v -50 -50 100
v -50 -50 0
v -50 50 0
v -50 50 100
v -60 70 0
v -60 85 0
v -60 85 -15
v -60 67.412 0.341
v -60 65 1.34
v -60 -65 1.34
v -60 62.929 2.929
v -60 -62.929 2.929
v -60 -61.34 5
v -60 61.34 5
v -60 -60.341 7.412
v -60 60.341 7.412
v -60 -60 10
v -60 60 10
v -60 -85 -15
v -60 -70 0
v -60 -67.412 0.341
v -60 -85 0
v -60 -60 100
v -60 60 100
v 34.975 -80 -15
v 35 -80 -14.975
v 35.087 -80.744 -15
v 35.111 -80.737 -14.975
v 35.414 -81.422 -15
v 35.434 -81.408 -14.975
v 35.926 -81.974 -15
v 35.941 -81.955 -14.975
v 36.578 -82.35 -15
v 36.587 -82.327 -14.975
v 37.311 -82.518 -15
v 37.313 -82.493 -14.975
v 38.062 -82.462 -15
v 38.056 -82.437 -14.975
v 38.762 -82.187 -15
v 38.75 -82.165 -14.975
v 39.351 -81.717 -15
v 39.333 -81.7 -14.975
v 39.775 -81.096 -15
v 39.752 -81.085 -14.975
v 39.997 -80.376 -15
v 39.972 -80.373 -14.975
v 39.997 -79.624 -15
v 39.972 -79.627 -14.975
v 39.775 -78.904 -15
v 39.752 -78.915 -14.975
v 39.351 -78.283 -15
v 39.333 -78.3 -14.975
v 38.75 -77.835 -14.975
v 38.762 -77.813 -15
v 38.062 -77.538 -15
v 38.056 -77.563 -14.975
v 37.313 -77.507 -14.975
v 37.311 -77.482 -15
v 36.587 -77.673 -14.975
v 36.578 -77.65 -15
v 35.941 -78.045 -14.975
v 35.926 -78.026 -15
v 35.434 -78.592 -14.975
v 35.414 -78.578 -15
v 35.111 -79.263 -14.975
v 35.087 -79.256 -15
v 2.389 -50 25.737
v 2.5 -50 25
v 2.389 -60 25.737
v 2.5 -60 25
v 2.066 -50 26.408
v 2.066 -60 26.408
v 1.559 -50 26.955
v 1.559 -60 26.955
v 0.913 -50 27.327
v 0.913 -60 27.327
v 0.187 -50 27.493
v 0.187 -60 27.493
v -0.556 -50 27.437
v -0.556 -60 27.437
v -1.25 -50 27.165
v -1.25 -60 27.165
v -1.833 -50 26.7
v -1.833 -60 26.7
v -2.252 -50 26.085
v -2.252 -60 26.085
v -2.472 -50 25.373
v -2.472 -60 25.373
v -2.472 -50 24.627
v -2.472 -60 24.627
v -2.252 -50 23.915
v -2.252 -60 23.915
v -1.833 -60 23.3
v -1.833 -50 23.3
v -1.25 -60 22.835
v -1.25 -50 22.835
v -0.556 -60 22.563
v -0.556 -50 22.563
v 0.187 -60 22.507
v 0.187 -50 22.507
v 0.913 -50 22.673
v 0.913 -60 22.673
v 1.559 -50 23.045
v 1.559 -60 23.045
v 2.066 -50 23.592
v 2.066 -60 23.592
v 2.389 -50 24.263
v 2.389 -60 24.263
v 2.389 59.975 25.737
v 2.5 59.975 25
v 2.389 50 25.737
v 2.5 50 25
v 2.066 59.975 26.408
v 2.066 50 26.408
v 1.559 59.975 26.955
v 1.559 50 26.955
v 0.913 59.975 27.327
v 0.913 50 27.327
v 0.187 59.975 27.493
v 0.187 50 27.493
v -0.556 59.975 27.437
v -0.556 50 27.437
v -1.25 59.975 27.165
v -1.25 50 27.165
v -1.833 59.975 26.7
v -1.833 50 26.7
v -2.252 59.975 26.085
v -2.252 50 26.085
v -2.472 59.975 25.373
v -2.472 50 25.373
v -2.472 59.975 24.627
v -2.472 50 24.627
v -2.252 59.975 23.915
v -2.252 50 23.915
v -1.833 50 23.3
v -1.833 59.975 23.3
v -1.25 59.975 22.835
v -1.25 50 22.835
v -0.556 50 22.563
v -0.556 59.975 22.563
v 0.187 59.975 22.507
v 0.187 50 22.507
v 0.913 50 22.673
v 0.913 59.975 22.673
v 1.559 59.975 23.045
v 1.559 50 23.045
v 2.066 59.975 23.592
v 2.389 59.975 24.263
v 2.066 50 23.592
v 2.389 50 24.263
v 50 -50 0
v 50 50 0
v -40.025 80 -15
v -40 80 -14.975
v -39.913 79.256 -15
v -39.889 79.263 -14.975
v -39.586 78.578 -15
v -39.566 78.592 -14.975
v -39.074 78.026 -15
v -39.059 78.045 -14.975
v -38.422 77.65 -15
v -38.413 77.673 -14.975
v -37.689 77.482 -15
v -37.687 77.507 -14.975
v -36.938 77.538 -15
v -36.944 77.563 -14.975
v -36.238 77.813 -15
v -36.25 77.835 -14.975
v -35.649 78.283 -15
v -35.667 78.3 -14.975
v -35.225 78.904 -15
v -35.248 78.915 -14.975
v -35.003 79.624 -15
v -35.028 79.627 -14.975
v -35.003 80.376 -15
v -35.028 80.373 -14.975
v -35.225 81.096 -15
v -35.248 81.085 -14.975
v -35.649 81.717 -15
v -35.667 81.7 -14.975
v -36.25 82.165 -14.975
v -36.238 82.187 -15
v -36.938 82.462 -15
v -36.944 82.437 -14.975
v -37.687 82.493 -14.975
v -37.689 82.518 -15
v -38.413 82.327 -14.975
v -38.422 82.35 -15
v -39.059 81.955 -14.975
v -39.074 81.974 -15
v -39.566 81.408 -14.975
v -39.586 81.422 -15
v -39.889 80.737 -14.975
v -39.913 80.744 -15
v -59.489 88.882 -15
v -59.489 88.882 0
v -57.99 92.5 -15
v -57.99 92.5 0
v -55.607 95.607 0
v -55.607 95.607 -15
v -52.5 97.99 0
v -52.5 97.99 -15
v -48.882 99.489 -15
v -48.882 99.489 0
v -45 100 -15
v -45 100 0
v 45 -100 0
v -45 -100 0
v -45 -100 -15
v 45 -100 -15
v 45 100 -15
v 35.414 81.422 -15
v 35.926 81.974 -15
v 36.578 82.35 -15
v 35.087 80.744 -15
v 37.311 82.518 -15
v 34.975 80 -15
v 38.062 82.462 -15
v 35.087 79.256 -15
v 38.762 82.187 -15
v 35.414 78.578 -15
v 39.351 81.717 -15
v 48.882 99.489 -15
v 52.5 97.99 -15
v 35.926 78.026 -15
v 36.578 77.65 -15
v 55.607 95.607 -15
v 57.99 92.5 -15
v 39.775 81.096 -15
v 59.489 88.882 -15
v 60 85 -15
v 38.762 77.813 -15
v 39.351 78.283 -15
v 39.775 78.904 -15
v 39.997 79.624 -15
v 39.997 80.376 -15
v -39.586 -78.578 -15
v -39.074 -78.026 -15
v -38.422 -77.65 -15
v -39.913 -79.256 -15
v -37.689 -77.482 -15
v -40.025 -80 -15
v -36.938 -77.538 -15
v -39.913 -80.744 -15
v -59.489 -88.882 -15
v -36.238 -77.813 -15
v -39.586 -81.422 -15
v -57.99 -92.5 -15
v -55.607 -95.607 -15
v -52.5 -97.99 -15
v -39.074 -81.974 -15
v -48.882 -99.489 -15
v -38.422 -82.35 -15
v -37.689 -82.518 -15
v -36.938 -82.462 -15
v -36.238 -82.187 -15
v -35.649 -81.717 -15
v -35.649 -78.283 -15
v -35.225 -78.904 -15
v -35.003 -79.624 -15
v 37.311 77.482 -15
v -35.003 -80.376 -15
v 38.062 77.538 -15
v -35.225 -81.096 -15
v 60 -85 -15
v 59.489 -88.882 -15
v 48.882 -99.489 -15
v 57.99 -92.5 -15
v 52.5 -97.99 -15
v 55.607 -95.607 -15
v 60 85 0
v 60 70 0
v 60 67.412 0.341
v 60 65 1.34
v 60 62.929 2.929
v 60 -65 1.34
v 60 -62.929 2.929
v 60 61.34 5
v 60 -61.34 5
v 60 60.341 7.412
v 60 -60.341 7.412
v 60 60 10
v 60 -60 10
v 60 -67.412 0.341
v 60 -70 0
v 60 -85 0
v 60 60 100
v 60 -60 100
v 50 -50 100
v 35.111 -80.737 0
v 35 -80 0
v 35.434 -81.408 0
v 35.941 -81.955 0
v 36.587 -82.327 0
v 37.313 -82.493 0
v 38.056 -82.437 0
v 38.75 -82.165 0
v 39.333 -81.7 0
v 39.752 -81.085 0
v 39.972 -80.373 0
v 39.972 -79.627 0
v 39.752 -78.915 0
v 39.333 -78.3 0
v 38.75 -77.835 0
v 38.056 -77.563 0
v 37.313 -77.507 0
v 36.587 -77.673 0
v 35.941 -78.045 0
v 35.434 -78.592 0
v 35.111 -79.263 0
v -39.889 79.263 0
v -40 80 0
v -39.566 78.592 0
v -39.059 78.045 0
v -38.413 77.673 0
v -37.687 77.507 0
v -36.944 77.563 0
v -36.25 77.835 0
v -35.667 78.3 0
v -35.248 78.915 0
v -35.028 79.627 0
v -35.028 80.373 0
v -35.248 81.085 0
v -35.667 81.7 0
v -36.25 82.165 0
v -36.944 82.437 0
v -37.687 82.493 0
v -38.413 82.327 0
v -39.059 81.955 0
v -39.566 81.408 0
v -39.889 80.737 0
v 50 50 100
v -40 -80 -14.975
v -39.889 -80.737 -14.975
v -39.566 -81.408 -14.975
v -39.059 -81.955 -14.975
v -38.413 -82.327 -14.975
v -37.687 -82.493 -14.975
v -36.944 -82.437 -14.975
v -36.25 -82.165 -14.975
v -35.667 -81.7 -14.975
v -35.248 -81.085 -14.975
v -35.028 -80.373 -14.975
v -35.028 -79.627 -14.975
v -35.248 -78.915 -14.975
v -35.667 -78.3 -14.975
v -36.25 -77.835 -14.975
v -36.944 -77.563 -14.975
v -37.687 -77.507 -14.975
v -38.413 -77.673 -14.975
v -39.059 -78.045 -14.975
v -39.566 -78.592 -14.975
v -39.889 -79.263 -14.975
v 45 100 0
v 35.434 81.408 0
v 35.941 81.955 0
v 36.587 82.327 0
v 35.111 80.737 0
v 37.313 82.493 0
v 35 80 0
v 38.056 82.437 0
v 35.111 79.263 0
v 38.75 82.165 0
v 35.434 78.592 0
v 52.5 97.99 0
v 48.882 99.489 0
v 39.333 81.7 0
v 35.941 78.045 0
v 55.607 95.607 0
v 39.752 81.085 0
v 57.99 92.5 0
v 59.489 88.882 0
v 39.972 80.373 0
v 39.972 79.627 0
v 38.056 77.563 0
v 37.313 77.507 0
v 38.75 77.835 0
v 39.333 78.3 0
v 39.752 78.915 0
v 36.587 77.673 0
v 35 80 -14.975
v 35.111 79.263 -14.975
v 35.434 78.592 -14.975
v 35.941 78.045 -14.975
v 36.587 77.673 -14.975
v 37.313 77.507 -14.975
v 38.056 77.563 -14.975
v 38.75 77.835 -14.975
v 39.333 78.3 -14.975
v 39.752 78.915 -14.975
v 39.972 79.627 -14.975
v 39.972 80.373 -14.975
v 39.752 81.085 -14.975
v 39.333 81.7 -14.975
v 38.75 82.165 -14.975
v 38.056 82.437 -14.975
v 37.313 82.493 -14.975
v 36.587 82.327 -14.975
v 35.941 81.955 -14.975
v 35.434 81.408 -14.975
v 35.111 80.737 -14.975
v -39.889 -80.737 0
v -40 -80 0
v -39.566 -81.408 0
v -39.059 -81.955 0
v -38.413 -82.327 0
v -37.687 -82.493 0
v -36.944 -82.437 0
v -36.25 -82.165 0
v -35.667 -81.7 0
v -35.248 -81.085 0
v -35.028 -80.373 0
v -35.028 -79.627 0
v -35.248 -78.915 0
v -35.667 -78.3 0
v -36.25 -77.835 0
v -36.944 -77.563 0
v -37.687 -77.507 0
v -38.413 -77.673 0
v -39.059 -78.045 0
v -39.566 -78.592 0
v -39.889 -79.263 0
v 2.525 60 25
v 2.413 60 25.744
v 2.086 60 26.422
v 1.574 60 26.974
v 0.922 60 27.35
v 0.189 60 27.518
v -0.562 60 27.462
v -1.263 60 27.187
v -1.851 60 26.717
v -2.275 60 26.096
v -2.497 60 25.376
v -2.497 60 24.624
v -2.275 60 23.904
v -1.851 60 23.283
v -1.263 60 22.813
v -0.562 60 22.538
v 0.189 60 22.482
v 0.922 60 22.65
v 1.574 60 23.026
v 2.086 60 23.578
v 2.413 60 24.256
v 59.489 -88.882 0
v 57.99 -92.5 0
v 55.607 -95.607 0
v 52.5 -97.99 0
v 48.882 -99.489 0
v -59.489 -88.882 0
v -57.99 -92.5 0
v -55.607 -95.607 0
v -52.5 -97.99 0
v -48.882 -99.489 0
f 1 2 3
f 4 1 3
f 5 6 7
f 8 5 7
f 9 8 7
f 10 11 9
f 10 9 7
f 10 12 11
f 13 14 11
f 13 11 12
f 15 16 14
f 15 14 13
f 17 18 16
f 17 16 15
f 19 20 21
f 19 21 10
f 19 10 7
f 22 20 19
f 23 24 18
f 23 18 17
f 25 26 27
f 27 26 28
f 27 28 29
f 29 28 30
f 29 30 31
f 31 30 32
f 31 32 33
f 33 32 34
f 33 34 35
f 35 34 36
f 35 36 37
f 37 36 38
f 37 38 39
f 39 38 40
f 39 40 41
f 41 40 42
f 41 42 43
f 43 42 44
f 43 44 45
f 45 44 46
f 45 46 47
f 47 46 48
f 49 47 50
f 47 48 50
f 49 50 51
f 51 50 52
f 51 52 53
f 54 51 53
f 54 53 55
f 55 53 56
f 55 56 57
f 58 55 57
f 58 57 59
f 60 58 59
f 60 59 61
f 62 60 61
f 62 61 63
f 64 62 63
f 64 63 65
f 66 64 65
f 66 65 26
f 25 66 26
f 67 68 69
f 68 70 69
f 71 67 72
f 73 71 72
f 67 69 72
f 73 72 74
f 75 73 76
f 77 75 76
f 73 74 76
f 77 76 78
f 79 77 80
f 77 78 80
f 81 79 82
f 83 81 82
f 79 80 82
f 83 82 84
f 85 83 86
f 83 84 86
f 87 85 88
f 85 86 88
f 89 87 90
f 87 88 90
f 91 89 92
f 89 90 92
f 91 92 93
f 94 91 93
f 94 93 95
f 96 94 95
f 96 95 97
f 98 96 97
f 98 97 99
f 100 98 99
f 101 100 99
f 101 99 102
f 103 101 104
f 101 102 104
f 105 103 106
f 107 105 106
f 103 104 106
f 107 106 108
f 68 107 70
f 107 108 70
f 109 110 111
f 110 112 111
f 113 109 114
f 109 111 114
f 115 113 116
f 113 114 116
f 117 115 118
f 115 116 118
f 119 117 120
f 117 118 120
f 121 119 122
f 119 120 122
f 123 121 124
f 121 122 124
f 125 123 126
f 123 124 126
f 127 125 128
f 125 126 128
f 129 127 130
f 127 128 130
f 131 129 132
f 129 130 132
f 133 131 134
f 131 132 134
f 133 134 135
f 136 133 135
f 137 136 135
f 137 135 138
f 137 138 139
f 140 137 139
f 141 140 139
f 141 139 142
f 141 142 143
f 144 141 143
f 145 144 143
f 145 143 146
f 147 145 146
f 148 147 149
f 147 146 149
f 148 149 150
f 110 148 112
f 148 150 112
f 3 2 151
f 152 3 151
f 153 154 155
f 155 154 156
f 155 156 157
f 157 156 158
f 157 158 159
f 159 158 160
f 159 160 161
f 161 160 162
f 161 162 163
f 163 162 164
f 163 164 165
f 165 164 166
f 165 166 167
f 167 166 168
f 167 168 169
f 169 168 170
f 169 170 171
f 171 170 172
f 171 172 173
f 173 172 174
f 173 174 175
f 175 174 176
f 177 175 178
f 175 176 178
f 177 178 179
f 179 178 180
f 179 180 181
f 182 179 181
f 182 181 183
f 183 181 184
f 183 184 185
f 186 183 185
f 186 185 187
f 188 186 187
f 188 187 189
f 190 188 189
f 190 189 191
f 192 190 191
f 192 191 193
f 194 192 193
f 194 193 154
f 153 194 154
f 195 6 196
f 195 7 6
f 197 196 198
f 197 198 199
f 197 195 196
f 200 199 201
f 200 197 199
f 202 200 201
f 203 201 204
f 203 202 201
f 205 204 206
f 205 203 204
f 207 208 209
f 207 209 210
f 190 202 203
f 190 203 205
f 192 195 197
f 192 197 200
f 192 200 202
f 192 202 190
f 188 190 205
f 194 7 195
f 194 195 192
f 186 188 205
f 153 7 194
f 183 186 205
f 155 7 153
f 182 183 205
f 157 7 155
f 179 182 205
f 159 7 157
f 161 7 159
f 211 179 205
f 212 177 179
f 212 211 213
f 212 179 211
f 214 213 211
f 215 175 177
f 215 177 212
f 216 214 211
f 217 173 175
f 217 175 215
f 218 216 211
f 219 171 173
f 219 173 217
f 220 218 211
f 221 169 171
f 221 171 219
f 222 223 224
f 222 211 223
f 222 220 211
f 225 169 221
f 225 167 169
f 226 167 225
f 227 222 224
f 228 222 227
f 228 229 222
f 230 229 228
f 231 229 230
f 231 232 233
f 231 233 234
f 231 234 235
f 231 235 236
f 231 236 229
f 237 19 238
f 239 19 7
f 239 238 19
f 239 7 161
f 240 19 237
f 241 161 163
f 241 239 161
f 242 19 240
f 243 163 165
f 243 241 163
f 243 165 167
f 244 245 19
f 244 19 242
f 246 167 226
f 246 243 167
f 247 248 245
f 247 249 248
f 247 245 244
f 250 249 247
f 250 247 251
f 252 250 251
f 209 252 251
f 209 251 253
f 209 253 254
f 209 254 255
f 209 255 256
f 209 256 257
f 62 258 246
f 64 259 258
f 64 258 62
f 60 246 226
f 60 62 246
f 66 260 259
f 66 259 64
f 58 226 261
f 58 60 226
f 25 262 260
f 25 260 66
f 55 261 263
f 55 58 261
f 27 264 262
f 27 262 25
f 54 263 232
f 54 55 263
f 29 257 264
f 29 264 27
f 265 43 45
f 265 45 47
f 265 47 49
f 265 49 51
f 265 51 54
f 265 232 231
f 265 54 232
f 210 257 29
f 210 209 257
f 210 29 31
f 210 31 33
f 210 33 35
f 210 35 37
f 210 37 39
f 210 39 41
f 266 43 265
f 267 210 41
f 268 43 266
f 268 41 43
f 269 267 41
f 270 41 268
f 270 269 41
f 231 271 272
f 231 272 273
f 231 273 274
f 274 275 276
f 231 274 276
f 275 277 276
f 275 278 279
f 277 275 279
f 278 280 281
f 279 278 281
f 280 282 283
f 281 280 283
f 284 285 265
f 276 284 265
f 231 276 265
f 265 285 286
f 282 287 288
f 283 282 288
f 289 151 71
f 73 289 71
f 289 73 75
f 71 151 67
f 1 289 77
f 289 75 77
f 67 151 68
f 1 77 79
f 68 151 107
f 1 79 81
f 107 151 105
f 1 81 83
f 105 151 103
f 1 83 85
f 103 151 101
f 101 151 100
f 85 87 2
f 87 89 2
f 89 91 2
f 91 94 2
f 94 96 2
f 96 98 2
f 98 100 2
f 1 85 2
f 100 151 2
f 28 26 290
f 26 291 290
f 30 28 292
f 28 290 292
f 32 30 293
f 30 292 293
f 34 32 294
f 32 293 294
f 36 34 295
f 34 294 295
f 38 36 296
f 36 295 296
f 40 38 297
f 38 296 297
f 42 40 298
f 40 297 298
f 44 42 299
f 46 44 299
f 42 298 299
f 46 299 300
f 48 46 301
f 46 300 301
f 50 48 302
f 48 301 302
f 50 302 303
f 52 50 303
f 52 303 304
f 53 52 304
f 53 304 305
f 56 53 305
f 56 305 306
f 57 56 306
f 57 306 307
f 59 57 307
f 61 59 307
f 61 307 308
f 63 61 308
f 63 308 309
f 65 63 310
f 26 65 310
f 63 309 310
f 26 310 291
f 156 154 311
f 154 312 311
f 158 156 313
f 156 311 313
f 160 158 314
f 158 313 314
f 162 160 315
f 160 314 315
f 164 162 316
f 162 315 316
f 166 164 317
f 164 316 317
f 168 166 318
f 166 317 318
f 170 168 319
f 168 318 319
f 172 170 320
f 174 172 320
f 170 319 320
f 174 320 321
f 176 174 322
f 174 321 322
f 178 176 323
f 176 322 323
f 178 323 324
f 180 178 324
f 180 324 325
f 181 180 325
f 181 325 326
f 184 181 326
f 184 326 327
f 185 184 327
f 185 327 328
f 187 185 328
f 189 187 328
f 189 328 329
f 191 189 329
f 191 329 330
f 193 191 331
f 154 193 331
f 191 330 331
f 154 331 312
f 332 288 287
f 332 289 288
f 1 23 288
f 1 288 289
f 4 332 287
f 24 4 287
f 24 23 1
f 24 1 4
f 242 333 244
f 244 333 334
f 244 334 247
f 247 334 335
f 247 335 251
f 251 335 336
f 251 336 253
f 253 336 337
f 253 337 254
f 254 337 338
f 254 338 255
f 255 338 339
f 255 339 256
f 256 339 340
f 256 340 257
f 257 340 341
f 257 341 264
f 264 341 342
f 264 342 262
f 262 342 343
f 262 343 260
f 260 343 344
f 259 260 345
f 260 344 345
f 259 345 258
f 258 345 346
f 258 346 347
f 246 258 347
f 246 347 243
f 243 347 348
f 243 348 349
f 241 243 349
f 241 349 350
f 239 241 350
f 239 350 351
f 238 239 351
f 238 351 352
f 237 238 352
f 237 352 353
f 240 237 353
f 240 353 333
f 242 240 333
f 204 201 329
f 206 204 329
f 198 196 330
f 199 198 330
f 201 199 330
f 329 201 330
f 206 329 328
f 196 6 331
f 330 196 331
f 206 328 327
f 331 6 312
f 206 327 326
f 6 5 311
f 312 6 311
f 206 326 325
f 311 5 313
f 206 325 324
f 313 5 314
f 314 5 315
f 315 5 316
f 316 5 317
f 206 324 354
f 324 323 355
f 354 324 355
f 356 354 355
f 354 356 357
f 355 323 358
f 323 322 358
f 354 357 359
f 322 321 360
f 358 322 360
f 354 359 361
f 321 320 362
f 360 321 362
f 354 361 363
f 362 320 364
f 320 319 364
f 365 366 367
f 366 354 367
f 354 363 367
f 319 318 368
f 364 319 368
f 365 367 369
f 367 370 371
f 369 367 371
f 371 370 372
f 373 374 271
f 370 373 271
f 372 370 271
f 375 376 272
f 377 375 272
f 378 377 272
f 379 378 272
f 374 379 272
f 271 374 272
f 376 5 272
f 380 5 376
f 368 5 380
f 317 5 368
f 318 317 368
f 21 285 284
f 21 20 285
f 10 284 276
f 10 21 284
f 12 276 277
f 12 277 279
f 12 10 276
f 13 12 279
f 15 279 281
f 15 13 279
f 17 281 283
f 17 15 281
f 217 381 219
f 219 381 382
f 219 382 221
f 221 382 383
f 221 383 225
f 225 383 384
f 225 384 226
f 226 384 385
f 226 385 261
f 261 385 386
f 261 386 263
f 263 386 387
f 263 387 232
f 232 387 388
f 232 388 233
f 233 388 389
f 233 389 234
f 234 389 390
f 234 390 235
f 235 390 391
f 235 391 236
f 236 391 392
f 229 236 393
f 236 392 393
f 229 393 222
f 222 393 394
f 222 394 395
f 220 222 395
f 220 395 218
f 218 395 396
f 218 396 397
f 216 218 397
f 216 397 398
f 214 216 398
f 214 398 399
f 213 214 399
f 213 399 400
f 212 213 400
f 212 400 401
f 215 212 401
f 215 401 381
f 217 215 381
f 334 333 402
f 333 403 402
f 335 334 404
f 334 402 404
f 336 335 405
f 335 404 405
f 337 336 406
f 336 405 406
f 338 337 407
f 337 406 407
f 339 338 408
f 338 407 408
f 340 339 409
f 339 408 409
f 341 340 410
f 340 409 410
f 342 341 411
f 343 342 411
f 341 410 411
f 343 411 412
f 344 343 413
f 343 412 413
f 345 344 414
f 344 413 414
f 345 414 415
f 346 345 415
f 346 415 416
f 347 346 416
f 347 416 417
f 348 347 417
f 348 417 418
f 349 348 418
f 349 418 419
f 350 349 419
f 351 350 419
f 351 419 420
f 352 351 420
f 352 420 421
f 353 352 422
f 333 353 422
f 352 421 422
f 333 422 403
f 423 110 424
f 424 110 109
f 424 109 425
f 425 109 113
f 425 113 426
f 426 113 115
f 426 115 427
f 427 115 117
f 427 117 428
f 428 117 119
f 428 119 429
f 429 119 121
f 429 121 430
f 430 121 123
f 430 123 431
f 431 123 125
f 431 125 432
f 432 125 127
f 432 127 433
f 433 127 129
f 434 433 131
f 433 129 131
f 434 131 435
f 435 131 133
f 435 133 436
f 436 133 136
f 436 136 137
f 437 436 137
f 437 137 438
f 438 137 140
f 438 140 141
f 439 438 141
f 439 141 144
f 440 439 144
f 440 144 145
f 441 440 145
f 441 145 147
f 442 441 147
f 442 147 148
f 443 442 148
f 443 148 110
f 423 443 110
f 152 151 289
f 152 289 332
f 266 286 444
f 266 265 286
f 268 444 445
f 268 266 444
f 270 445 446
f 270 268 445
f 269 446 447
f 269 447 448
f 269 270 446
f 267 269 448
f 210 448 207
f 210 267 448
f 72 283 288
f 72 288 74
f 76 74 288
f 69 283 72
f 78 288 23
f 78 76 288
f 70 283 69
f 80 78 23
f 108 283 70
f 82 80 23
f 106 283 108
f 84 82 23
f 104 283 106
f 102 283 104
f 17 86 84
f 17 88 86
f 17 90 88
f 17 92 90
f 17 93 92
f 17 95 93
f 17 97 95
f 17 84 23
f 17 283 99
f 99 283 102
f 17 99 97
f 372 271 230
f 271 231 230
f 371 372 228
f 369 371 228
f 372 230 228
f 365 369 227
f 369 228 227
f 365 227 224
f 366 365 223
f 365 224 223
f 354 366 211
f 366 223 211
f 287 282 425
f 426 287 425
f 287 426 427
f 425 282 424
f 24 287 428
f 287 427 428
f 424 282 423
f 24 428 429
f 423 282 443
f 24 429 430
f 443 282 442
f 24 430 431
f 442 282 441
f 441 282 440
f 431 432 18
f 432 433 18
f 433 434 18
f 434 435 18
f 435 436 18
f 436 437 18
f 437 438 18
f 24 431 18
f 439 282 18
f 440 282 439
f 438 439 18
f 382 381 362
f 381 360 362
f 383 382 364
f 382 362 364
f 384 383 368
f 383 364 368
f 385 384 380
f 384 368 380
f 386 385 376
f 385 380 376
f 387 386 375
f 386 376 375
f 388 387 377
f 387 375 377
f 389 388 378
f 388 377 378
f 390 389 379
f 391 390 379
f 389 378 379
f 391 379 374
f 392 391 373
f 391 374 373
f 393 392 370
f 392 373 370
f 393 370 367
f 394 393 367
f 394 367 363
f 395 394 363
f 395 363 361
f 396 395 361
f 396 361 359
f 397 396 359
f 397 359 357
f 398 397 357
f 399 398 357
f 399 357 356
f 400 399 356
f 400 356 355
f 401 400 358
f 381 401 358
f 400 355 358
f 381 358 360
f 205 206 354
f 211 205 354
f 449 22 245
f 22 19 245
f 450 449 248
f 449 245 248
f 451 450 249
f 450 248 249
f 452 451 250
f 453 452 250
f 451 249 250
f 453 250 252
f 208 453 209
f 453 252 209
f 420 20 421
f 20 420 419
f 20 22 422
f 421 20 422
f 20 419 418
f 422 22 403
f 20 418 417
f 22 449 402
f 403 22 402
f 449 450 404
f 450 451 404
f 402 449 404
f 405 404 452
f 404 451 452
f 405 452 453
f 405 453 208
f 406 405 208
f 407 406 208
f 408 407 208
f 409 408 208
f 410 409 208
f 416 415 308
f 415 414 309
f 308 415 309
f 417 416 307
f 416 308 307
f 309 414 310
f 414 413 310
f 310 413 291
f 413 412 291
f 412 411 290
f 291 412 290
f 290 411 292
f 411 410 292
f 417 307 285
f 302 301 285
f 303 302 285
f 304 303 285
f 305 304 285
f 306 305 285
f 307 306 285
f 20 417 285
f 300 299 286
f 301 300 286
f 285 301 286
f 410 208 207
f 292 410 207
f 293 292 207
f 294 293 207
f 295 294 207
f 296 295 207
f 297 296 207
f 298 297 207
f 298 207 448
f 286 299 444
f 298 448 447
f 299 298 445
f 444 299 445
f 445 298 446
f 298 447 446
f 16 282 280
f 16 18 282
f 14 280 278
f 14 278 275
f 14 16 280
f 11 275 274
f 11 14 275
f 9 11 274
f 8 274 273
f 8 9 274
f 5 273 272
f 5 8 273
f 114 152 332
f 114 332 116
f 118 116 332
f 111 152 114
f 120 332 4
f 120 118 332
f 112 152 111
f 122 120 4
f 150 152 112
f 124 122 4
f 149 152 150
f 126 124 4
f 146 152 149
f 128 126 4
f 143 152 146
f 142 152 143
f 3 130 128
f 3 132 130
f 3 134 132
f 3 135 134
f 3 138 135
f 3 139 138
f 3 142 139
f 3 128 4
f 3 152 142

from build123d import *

# Parameters (mm, degrees)
SKETCH1_W                       = 120
SKETCH1_H                       = 120
SKETCH1_W_2                     = 100
SKETCH1_H_2                     = 100
BOSS_EXTRUDE1_DEPTH             = 100
SKETCH2_W                       = 120
SKETCH2_H                       = 40
SKETCH2_H_2                     = 120
SKETCH2_W_2                     = 100
SKETCH2_H_3                     = 100
BOSS_EXTRUDE2_DEPTH             = 15
F_5_0MM_DOWEL_HOLE2_D           = 5
F_5_0MM_DOWEL_HOLE2_CSINK_D     = 5.05
F_5_0MM_DOWEL_HOLE2_CSINK_ANGLE = 90
F_5_0MM_DOWEL_HOLE1_D           = 5
F_5_0MM_DOWEL_HOLE1_CSINK_D     = 5.05
F_5_0MM_DOWEL_HOLE1_CSINK_ANGLE = 90
FILLET1_R                       = 15
FILLET2_R                       = 10


with BuildPart() as part:
    # Sketch1 → Boss-Extrude1 (new body)
    with BuildSketch(Plane(origin=(0, 0, 0), x_dir=(0, 1, 0), z_dir=(0, 0, 1))):
        Rectangle(SKETCH1_W, SKETCH1_H)
        Rectangle(SKETCH1_W_2, SKETCH1_H_2, mode=Mode.SUBTRACT)
    extrude(amount=BOSS_EXTRUDE1_DEPTH)

    # Sketch2 → Boss-Extrude2 (add)
    # profile 1 of 4: a face of its own
    with BuildSketch(Plane(origin=(0, 0, 0), x_dir=(1, 0, 0), z_dir=(0, 0, -1))):
        with Locations((0, 80)):
            Rectangle(SKETCH2_W, SKETCH2_H)
    # profile 2 of 4: a face of its own
    with BuildSketch(Plane(origin=(0, 0, 0), x_dir=(1, 0, 0), z_dir=(0, 0, -1))):
        with Locations((0, -80)):
            Rectangle(SKETCH2_W, SKETCH2_H)
    # profile 3 of 4: a face of its own
    with BuildSketch(Plane(origin=(0, 0, 0), x_dir=(1, 0, 0), z_dir=(0, 0, -1))):
        Rectangle(SKETCH2_W, SKETCH2_H_2)
        Rectangle(SKETCH2_W_2, SKETCH2_H_3, mode=Mode.SUBTRACT)
    # profile 4 of 4: a face of its own
    with BuildSketch(Plane(origin=(0, 0, 0), x_dir=(1, 0, 0), z_dir=(0, 0, -1))):
        Rectangle(SKETCH2_W_2, SKETCH2_H_3)
    extrude(amount=BOSS_EXTRUDE2_DEPTH)

    # Ø5.0mm Dowel Hole2 (through all)
    with Locations(Plane(origin=(0, 0, -15), x_dir=(1, 0, 0), z_dir=(0, 0, -1))):
        with Locations((37.5, -80), (-37.5, 80), (37.5, 80), (-37.5, -80)):
            CounterSinkHole(F_5_0MM_DOWEL_HOLE2_D / 2, F_5_0MM_DOWEL_HOLE2_CSINK_D / 2, counter_sink_angle=F_5_0MM_DOWEL_HOLE2_CSINK_ANGLE)

    # Ø5.0mm Dowel Hole1 (through all)
    with Locations(Plane(origin=(0, 60, 0), x_dir=(-1, 0, 0), z_dir=(0, 1, 0))):
        with Locations((0, 25)):
            CounterSinkHole(F_5_0MM_DOWEL_HOLE1_D / 2, F_5_0MM_DOWEL_HOLE1_CSINK_D / 2, counter_sink_angle=F_5_0MM_DOWEL_HOLE1_CSINK_ANGLE)

    # Fillet1
    fillet1_edges = [part.edges().sort_by_distance(p)[0] for p in [
        (60, -100, -7.5),
        (-60, -100, -7.5),
        (-60, 100, -7.5),
        (60, 100, -7.5),
    ]]
    fillet(fillet1_edges, radius=FILLET1_R)

    # Fillet2
    fillet2_edges = [part.edges().sort_by_distance(p)[0] for p in [
        (0, 60, 0),
        (0, -60, 0),
    ]]
    fillet(fillet2_edges, radius=FILLET2_R)


solid = part.part
